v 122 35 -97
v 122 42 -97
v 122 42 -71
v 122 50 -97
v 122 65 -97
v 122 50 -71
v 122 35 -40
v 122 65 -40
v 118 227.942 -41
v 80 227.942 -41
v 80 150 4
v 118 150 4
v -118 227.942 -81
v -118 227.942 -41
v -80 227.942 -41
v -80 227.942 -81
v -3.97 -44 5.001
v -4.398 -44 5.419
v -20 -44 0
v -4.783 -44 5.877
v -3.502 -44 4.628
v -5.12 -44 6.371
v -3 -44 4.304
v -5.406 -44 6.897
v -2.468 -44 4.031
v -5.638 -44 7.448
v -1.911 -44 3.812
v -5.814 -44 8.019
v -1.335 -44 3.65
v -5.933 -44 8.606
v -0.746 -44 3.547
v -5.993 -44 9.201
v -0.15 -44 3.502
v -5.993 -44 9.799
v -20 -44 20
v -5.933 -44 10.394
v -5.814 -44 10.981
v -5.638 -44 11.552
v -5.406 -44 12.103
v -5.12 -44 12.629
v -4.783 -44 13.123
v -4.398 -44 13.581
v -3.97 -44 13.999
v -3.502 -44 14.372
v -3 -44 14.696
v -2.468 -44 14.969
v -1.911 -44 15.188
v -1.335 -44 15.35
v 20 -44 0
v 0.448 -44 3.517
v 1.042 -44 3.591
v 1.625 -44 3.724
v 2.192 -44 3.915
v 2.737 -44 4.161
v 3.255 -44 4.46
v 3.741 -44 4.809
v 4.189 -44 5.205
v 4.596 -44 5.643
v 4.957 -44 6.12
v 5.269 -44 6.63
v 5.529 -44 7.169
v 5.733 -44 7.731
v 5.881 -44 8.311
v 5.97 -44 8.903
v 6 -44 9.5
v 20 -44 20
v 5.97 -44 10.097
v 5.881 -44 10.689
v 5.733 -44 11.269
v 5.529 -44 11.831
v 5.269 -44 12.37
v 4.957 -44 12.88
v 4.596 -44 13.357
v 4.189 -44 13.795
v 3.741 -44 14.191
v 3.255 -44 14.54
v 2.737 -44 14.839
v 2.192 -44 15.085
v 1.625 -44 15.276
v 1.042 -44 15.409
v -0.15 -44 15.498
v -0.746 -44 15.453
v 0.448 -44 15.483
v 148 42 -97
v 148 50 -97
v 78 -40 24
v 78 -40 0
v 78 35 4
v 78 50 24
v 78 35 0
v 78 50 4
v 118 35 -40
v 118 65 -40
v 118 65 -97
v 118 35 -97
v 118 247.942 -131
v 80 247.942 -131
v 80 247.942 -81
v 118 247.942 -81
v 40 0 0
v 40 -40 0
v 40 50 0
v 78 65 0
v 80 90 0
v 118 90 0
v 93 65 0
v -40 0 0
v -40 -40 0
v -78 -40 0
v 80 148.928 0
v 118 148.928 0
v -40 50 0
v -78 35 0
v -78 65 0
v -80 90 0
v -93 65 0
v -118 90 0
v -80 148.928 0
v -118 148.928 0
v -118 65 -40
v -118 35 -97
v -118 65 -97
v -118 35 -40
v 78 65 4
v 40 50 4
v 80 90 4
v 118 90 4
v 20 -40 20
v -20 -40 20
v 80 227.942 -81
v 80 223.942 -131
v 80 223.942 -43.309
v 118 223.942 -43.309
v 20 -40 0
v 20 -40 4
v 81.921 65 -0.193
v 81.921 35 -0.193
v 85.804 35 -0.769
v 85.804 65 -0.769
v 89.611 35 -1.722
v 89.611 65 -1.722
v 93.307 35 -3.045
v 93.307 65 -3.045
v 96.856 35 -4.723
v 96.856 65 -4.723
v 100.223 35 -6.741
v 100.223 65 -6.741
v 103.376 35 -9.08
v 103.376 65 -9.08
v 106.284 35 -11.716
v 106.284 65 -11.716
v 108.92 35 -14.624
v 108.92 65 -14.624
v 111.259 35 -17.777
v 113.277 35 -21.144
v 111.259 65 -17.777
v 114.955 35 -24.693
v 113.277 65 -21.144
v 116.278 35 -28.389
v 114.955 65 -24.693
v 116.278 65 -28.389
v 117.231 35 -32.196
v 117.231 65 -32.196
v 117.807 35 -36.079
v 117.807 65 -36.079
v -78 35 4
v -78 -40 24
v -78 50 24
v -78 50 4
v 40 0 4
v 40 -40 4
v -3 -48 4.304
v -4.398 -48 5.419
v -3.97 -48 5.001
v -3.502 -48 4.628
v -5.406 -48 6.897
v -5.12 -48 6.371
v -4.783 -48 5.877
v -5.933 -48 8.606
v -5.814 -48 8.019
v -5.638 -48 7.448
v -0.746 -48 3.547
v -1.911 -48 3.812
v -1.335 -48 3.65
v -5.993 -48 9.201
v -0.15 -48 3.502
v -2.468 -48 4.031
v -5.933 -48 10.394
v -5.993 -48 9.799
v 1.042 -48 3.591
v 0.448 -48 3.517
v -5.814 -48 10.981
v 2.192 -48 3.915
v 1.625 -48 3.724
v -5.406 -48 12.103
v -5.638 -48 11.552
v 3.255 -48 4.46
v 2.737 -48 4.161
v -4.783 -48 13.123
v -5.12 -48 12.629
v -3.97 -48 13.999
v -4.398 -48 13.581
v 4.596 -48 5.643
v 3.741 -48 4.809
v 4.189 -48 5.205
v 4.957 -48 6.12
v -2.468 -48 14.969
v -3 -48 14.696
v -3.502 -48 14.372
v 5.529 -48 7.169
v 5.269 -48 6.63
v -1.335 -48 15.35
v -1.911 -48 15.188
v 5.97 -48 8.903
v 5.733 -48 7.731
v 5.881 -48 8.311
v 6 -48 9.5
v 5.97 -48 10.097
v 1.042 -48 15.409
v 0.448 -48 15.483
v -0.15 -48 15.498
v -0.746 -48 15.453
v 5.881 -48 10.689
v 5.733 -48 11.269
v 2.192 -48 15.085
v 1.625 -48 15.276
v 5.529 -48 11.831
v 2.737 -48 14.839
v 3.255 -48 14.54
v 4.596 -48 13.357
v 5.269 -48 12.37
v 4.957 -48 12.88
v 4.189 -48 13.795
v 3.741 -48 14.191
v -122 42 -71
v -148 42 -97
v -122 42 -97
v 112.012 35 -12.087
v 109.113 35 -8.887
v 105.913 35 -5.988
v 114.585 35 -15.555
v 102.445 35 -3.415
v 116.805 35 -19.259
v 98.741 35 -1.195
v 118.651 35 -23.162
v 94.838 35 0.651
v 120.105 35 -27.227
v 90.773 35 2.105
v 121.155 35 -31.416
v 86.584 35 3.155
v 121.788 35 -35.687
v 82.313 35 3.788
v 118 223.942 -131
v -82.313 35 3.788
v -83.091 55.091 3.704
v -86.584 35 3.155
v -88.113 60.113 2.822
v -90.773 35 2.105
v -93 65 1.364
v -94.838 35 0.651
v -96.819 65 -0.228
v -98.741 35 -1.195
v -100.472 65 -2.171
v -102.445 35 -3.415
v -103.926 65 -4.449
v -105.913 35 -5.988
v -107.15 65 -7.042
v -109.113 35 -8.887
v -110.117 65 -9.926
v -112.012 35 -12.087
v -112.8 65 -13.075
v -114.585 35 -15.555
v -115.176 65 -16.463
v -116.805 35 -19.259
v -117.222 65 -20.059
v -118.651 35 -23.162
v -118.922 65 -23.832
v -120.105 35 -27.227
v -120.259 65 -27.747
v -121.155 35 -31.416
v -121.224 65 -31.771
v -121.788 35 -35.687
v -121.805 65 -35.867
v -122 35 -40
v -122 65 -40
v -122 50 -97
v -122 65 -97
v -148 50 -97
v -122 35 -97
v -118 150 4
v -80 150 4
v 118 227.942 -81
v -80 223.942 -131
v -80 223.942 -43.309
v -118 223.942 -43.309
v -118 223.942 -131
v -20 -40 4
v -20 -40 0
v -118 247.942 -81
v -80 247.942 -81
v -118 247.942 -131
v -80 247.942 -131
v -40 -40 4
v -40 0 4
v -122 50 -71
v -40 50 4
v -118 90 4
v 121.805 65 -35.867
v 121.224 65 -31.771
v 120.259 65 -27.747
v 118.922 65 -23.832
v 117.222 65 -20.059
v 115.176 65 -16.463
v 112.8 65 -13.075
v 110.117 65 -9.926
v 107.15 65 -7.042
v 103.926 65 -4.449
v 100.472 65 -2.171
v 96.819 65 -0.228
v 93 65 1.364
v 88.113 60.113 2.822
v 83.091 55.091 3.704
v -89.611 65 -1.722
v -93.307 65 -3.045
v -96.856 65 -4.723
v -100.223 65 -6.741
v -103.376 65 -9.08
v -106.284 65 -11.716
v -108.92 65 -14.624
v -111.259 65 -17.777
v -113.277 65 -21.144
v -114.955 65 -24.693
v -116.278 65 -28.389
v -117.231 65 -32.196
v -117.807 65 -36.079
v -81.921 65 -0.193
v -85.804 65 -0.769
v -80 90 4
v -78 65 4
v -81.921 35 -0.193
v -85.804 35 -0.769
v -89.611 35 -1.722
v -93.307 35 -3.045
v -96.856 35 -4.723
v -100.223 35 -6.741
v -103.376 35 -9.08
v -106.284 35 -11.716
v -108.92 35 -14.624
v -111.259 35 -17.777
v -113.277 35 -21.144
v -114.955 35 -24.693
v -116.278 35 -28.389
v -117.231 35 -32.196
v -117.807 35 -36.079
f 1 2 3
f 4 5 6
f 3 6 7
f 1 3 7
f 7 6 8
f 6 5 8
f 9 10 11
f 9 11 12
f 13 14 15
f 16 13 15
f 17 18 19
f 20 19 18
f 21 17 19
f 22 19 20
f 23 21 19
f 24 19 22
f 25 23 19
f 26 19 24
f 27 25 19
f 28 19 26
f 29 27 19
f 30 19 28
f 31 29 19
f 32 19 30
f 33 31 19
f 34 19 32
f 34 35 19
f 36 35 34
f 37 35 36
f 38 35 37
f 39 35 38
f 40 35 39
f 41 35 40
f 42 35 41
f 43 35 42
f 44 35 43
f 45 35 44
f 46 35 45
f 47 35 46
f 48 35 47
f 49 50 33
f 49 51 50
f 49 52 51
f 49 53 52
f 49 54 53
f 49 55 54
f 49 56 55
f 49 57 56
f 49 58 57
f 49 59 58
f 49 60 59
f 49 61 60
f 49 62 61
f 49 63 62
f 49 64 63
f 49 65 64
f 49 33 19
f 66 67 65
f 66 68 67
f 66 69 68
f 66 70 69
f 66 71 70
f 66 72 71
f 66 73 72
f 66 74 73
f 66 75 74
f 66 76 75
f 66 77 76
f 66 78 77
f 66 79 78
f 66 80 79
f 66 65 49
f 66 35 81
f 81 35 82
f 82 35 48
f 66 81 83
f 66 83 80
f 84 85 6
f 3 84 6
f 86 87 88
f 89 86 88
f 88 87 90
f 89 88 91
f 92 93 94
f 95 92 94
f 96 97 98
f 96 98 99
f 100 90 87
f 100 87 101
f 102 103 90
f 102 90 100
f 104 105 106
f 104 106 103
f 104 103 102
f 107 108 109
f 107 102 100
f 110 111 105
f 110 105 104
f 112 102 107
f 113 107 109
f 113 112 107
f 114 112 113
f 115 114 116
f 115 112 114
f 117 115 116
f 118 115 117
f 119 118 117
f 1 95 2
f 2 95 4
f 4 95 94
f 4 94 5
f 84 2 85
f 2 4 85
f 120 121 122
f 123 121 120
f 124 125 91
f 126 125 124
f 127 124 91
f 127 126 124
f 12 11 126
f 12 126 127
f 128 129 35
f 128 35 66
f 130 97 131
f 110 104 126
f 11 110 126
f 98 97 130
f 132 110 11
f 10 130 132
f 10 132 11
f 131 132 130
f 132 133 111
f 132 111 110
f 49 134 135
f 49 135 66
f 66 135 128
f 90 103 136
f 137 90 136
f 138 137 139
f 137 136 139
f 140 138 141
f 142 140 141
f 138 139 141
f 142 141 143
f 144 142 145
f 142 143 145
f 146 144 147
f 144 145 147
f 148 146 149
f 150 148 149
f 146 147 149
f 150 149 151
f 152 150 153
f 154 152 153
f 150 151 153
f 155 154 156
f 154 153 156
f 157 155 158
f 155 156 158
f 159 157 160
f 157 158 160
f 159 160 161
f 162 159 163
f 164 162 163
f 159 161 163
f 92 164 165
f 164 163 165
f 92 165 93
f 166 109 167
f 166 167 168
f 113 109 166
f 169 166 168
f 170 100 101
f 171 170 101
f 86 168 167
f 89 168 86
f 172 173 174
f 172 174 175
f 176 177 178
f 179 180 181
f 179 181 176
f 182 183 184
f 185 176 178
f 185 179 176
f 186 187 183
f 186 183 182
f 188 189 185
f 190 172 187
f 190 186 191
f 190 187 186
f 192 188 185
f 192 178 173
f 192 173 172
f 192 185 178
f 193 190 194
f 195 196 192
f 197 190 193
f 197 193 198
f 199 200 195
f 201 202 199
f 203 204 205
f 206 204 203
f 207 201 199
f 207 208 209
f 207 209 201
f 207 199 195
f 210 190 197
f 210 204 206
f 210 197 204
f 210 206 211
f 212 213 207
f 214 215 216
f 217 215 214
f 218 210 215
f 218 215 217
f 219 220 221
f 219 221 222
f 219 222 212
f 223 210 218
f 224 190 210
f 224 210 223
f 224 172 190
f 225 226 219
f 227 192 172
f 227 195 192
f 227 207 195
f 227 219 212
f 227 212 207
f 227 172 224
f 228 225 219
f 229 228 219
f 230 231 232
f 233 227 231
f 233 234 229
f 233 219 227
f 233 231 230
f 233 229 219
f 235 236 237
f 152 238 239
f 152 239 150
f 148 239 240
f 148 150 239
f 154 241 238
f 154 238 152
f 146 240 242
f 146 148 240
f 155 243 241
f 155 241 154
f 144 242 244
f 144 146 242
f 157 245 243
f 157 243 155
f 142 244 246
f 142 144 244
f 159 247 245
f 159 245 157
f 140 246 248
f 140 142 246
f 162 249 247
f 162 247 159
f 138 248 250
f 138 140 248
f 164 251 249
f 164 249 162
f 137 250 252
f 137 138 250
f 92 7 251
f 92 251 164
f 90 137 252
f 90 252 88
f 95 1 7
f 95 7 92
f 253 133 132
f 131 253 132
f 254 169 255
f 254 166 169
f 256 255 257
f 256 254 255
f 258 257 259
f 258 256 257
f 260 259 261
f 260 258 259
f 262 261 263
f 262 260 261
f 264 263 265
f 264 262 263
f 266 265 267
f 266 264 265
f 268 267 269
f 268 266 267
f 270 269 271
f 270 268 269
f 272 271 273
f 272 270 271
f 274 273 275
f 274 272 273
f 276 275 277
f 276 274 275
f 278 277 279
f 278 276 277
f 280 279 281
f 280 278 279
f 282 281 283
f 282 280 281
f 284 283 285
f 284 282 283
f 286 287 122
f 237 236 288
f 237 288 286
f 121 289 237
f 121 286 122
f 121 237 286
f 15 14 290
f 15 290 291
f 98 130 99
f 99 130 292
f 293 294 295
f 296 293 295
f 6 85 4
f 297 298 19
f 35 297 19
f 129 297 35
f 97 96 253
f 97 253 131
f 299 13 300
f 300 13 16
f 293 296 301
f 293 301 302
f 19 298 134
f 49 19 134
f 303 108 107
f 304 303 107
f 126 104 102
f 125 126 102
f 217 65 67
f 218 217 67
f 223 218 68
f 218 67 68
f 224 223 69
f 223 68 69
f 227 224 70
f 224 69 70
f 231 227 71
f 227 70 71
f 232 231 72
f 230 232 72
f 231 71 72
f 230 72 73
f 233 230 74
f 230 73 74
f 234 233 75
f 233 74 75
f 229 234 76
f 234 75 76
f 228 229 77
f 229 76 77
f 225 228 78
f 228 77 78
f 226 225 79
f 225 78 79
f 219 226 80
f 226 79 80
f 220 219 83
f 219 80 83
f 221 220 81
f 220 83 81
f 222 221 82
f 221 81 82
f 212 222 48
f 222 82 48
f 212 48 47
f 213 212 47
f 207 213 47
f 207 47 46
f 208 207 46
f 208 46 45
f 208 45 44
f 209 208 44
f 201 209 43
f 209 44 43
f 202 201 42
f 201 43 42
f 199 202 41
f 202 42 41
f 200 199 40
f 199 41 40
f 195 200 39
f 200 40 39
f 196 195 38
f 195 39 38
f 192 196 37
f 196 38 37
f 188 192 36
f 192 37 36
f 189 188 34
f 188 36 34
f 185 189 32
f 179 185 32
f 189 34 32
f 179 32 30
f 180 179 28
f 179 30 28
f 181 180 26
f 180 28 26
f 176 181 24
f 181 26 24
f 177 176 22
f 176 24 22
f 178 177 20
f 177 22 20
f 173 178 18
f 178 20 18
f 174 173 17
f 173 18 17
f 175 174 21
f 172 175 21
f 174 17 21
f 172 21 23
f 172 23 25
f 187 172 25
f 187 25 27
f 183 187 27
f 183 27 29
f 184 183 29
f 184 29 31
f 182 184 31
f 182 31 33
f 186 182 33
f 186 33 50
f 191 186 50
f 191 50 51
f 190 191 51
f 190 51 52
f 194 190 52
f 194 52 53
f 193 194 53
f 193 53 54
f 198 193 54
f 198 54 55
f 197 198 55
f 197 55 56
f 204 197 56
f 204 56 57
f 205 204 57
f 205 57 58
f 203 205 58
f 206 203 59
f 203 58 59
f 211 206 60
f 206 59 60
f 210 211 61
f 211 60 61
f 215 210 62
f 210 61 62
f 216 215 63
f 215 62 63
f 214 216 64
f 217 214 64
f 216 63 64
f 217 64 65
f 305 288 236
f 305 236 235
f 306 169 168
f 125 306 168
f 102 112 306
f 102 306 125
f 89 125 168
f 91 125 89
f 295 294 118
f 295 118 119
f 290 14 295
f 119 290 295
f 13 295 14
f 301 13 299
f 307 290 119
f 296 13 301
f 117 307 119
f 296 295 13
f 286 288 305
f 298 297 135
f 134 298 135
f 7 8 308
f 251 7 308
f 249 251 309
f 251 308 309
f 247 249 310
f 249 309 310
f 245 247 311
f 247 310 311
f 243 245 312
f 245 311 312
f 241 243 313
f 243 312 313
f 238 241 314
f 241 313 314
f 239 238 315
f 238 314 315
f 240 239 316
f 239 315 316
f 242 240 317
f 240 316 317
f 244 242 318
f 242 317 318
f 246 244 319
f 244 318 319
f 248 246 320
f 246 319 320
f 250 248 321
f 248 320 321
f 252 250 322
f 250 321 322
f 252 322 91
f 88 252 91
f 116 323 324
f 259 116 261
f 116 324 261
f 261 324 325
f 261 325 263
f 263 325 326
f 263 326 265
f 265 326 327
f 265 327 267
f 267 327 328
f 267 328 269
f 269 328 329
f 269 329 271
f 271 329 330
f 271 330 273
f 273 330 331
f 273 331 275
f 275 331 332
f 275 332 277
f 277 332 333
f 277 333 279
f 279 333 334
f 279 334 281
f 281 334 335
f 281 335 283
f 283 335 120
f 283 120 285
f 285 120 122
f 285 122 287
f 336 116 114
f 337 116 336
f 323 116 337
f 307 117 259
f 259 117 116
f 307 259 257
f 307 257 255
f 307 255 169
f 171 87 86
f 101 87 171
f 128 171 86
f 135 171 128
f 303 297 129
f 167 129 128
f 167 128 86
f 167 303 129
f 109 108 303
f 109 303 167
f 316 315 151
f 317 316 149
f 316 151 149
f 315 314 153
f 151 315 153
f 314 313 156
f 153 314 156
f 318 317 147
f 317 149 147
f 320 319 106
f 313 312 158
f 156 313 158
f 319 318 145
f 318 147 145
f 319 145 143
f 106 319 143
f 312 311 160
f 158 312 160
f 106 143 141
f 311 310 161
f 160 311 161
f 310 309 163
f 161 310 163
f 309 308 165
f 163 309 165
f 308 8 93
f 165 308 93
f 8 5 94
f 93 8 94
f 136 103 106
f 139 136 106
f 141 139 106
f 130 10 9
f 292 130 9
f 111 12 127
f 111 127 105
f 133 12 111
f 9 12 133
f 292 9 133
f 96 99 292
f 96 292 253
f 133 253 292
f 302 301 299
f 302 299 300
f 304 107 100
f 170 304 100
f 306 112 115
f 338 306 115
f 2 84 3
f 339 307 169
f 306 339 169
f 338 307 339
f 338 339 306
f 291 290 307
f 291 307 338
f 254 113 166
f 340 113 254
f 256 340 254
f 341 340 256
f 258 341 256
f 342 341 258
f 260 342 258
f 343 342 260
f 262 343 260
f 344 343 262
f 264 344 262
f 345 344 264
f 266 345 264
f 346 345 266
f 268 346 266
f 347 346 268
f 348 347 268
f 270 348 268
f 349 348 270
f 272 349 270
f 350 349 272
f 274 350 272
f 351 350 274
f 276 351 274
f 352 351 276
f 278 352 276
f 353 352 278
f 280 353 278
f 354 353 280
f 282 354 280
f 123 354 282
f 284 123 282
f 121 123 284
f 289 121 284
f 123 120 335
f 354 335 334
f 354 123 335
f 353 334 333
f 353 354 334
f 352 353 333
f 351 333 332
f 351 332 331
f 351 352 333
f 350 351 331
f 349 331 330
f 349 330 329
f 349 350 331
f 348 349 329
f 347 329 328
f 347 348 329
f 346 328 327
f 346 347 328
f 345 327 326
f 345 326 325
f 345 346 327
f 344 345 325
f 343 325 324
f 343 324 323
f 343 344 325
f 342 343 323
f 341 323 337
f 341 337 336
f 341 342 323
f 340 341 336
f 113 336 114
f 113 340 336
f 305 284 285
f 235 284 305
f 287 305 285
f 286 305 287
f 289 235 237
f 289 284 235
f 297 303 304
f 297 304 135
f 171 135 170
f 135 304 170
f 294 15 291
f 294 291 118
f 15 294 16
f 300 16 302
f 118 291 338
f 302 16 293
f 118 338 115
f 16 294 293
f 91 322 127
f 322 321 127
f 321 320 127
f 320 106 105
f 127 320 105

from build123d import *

# Parameters (mm, degrees)
EXTRUDE_1_DEPTH     = 4
SKETCH_11_W         = 156
SKETCH_11_H         = 90
EXTRUDE_2_DEPTH     = 20
SKETCH_12_W         = 38
SKETCH_12_H         = 4
SKETCH_14_W         = 38
SKETCH_14_H         = 50
EXTRUDE_3_DEPTH     = 20
SKETCH_16_W         = 238.183586275
SKETCH_16_H         = 132.295328182
CUT_EXTRUDE_1_DEPTH = 10
SKETCH_17_W         = 40
SKETCH_17_H         = 20
EXTRUDE_4_DEPTH     = 4
SKETCH_21_R         = 6
EXTRUDE_8_DEPTH     = 4
EXTRUDE_11_DEPTH    = 15
EXTRUDE_12_DEPTH    = 8


with BuildPart() as part:
    # 草图1 → 凸台-拉伸1 (new body)
    with BuildSketch(Plane.XY):
        Polygon((-40, 0), (40, 0), (40, -160), (78, -160), (78, 0), (78, 50), (118, 90), (80, 90), (40, 50), (-40, 50), (-80, 90), (-118, 90), (-78, 50), (-78, 0), (-78, -160), (-40, -160), align=None)
    extrude(amount=EXTRUDE_1_DEPTH)

    # 草图11 → 凸台-拉伸2 (add)
    with BuildSketch(Plane.XY.offset(4)):
        with Locations((0, 5)):
            Rectangle(SKETCH_11_W, SKETCH_11_H)
    extrude(amount=EXTRUDE_2_DEPTH)

    # 扫描1: sweep along a path in 草图13
    with BuildLine(Plane(origin=(78, 0, 0), x_dir=(0, 0, -1), z_dir=(1, 0, 0))) as sweep_1_path:
        Line((-4, 90), (-4, 150))
        Line((-4, 150), (41, 227.942286341))
        Line((41, 227.942286341), (131, 227.942286341))
    # 草图12 → 扫描1 (sweep)
    with BuildSketch(Plane(origin=(0, 90, 0), x_dir=(1, 0, 0), z_dir=(0, 1, 0))):
        with Locations((-99, -2)):
            Rectangle(SKETCH_12_W, SKETCH_12_H)
        with Locations((99, -2)):
            Rectangle(SKETCH_12_W, SKETCH_12_H)
    sweep(path=sweep_1_path.line, transition=Transition.RIGHT)

    # 草图14 → 凸台-拉伸3 (add)
    with BuildSketch(Plane(origin=(0, 227.942286341, 0), x_dir=(1, 0, 0), z_dir=(0, 1, 0))):
        with Locations((-99, 106)):
            Rectangle(SKETCH_14_W, SKETCH_14_H)
        with Locations((99, 106)):
            Rectangle(SKETCH_14_W, SKETCH_14_H)
    extrude(amount=EXTRUDE_3_DEPTH)

    # 草图16 → 切除-拉伸1 (cut)
    with BuildSketch(Plane(origin=(0, 0, 0), x_dir=(-1, 0, 0), z_dir=(0, 0, -1))):
        with Locations((8.714033644, -106.147664091)):
            Rectangle(SKETCH_16_W, SKETCH_16_H)
    extrude(amount=-CUT_EXTRUDE_1_DEPTH, mode=Mode.SUBTRACT)

    # 草图17 → 凸台-拉伸4 (add)
    with BuildSketch(Plane.XZ.offset(40)):
        with Locations((0, 10)):
            Rectangle(SKETCH_17_W, SKETCH_17_H)
    extrude(amount=EXTRUDE_4_DEPTH)

    # 草图21 → 凸台-拉伸8 (add)
    with BuildSketch(Plane.XZ.offset(44)):
        with Locations((0, 9.5)):
            Circle(SKETCH_21_R)
    extrude(amount=EXTRUDE_8_DEPTH)

    # 草图28 → 凸台-拉伸11 (add, symmetric)
    with BuildSketch(Plane(origin=(0, 50, 0), x_dir=(1, 0, 0), z_dir=(0, 1, 0))):
        with BuildLine():
            Line((-122, 40), (-122, 97))
            Line((-122, 97), (-118, 97))
            Line((-118, 97), (-118, 40))
            ThreePointArc((-118, 40), (-106.284271247, 11.715728753), (-78, 0))
            Line((-78, 0), (-78, -4))
            ThreePointArc((-78, -4), (-109.112698372, 8.887301628), (-122, 40))
        make_face()
        with BuildLine():
            Line((118, 40), (118, 97))
            Line((118, 97), (122, 97))
            Line((122, 97), (122, 40))
            ThreePointArc((122, 40), (109.112698372, 8.887301628), (78, -4))
            Line((78, -4), (78, 0))
            ThreePointArc((78, 0), (106.284271247, 11.715728753), (118, 40))
        make_face()
    extrude(amount=EXTRUDE_11_DEPTH, both=True)

    # 草图29 → 凸台-拉伸12 (add)
    with BuildSketch(Plane(origin=(0, 50, 0), x_dir=(1, 0, 0), z_dir=(0, 1, 0))):
        Polygon((122, 97), (148, 97), (122, 71), align=None)
        Polygon((-122, 97), (-148, 97), (-122, 71), align=None)
    extrude(amount=-EXTRUDE_12_DEPTH)


solid = part.part
